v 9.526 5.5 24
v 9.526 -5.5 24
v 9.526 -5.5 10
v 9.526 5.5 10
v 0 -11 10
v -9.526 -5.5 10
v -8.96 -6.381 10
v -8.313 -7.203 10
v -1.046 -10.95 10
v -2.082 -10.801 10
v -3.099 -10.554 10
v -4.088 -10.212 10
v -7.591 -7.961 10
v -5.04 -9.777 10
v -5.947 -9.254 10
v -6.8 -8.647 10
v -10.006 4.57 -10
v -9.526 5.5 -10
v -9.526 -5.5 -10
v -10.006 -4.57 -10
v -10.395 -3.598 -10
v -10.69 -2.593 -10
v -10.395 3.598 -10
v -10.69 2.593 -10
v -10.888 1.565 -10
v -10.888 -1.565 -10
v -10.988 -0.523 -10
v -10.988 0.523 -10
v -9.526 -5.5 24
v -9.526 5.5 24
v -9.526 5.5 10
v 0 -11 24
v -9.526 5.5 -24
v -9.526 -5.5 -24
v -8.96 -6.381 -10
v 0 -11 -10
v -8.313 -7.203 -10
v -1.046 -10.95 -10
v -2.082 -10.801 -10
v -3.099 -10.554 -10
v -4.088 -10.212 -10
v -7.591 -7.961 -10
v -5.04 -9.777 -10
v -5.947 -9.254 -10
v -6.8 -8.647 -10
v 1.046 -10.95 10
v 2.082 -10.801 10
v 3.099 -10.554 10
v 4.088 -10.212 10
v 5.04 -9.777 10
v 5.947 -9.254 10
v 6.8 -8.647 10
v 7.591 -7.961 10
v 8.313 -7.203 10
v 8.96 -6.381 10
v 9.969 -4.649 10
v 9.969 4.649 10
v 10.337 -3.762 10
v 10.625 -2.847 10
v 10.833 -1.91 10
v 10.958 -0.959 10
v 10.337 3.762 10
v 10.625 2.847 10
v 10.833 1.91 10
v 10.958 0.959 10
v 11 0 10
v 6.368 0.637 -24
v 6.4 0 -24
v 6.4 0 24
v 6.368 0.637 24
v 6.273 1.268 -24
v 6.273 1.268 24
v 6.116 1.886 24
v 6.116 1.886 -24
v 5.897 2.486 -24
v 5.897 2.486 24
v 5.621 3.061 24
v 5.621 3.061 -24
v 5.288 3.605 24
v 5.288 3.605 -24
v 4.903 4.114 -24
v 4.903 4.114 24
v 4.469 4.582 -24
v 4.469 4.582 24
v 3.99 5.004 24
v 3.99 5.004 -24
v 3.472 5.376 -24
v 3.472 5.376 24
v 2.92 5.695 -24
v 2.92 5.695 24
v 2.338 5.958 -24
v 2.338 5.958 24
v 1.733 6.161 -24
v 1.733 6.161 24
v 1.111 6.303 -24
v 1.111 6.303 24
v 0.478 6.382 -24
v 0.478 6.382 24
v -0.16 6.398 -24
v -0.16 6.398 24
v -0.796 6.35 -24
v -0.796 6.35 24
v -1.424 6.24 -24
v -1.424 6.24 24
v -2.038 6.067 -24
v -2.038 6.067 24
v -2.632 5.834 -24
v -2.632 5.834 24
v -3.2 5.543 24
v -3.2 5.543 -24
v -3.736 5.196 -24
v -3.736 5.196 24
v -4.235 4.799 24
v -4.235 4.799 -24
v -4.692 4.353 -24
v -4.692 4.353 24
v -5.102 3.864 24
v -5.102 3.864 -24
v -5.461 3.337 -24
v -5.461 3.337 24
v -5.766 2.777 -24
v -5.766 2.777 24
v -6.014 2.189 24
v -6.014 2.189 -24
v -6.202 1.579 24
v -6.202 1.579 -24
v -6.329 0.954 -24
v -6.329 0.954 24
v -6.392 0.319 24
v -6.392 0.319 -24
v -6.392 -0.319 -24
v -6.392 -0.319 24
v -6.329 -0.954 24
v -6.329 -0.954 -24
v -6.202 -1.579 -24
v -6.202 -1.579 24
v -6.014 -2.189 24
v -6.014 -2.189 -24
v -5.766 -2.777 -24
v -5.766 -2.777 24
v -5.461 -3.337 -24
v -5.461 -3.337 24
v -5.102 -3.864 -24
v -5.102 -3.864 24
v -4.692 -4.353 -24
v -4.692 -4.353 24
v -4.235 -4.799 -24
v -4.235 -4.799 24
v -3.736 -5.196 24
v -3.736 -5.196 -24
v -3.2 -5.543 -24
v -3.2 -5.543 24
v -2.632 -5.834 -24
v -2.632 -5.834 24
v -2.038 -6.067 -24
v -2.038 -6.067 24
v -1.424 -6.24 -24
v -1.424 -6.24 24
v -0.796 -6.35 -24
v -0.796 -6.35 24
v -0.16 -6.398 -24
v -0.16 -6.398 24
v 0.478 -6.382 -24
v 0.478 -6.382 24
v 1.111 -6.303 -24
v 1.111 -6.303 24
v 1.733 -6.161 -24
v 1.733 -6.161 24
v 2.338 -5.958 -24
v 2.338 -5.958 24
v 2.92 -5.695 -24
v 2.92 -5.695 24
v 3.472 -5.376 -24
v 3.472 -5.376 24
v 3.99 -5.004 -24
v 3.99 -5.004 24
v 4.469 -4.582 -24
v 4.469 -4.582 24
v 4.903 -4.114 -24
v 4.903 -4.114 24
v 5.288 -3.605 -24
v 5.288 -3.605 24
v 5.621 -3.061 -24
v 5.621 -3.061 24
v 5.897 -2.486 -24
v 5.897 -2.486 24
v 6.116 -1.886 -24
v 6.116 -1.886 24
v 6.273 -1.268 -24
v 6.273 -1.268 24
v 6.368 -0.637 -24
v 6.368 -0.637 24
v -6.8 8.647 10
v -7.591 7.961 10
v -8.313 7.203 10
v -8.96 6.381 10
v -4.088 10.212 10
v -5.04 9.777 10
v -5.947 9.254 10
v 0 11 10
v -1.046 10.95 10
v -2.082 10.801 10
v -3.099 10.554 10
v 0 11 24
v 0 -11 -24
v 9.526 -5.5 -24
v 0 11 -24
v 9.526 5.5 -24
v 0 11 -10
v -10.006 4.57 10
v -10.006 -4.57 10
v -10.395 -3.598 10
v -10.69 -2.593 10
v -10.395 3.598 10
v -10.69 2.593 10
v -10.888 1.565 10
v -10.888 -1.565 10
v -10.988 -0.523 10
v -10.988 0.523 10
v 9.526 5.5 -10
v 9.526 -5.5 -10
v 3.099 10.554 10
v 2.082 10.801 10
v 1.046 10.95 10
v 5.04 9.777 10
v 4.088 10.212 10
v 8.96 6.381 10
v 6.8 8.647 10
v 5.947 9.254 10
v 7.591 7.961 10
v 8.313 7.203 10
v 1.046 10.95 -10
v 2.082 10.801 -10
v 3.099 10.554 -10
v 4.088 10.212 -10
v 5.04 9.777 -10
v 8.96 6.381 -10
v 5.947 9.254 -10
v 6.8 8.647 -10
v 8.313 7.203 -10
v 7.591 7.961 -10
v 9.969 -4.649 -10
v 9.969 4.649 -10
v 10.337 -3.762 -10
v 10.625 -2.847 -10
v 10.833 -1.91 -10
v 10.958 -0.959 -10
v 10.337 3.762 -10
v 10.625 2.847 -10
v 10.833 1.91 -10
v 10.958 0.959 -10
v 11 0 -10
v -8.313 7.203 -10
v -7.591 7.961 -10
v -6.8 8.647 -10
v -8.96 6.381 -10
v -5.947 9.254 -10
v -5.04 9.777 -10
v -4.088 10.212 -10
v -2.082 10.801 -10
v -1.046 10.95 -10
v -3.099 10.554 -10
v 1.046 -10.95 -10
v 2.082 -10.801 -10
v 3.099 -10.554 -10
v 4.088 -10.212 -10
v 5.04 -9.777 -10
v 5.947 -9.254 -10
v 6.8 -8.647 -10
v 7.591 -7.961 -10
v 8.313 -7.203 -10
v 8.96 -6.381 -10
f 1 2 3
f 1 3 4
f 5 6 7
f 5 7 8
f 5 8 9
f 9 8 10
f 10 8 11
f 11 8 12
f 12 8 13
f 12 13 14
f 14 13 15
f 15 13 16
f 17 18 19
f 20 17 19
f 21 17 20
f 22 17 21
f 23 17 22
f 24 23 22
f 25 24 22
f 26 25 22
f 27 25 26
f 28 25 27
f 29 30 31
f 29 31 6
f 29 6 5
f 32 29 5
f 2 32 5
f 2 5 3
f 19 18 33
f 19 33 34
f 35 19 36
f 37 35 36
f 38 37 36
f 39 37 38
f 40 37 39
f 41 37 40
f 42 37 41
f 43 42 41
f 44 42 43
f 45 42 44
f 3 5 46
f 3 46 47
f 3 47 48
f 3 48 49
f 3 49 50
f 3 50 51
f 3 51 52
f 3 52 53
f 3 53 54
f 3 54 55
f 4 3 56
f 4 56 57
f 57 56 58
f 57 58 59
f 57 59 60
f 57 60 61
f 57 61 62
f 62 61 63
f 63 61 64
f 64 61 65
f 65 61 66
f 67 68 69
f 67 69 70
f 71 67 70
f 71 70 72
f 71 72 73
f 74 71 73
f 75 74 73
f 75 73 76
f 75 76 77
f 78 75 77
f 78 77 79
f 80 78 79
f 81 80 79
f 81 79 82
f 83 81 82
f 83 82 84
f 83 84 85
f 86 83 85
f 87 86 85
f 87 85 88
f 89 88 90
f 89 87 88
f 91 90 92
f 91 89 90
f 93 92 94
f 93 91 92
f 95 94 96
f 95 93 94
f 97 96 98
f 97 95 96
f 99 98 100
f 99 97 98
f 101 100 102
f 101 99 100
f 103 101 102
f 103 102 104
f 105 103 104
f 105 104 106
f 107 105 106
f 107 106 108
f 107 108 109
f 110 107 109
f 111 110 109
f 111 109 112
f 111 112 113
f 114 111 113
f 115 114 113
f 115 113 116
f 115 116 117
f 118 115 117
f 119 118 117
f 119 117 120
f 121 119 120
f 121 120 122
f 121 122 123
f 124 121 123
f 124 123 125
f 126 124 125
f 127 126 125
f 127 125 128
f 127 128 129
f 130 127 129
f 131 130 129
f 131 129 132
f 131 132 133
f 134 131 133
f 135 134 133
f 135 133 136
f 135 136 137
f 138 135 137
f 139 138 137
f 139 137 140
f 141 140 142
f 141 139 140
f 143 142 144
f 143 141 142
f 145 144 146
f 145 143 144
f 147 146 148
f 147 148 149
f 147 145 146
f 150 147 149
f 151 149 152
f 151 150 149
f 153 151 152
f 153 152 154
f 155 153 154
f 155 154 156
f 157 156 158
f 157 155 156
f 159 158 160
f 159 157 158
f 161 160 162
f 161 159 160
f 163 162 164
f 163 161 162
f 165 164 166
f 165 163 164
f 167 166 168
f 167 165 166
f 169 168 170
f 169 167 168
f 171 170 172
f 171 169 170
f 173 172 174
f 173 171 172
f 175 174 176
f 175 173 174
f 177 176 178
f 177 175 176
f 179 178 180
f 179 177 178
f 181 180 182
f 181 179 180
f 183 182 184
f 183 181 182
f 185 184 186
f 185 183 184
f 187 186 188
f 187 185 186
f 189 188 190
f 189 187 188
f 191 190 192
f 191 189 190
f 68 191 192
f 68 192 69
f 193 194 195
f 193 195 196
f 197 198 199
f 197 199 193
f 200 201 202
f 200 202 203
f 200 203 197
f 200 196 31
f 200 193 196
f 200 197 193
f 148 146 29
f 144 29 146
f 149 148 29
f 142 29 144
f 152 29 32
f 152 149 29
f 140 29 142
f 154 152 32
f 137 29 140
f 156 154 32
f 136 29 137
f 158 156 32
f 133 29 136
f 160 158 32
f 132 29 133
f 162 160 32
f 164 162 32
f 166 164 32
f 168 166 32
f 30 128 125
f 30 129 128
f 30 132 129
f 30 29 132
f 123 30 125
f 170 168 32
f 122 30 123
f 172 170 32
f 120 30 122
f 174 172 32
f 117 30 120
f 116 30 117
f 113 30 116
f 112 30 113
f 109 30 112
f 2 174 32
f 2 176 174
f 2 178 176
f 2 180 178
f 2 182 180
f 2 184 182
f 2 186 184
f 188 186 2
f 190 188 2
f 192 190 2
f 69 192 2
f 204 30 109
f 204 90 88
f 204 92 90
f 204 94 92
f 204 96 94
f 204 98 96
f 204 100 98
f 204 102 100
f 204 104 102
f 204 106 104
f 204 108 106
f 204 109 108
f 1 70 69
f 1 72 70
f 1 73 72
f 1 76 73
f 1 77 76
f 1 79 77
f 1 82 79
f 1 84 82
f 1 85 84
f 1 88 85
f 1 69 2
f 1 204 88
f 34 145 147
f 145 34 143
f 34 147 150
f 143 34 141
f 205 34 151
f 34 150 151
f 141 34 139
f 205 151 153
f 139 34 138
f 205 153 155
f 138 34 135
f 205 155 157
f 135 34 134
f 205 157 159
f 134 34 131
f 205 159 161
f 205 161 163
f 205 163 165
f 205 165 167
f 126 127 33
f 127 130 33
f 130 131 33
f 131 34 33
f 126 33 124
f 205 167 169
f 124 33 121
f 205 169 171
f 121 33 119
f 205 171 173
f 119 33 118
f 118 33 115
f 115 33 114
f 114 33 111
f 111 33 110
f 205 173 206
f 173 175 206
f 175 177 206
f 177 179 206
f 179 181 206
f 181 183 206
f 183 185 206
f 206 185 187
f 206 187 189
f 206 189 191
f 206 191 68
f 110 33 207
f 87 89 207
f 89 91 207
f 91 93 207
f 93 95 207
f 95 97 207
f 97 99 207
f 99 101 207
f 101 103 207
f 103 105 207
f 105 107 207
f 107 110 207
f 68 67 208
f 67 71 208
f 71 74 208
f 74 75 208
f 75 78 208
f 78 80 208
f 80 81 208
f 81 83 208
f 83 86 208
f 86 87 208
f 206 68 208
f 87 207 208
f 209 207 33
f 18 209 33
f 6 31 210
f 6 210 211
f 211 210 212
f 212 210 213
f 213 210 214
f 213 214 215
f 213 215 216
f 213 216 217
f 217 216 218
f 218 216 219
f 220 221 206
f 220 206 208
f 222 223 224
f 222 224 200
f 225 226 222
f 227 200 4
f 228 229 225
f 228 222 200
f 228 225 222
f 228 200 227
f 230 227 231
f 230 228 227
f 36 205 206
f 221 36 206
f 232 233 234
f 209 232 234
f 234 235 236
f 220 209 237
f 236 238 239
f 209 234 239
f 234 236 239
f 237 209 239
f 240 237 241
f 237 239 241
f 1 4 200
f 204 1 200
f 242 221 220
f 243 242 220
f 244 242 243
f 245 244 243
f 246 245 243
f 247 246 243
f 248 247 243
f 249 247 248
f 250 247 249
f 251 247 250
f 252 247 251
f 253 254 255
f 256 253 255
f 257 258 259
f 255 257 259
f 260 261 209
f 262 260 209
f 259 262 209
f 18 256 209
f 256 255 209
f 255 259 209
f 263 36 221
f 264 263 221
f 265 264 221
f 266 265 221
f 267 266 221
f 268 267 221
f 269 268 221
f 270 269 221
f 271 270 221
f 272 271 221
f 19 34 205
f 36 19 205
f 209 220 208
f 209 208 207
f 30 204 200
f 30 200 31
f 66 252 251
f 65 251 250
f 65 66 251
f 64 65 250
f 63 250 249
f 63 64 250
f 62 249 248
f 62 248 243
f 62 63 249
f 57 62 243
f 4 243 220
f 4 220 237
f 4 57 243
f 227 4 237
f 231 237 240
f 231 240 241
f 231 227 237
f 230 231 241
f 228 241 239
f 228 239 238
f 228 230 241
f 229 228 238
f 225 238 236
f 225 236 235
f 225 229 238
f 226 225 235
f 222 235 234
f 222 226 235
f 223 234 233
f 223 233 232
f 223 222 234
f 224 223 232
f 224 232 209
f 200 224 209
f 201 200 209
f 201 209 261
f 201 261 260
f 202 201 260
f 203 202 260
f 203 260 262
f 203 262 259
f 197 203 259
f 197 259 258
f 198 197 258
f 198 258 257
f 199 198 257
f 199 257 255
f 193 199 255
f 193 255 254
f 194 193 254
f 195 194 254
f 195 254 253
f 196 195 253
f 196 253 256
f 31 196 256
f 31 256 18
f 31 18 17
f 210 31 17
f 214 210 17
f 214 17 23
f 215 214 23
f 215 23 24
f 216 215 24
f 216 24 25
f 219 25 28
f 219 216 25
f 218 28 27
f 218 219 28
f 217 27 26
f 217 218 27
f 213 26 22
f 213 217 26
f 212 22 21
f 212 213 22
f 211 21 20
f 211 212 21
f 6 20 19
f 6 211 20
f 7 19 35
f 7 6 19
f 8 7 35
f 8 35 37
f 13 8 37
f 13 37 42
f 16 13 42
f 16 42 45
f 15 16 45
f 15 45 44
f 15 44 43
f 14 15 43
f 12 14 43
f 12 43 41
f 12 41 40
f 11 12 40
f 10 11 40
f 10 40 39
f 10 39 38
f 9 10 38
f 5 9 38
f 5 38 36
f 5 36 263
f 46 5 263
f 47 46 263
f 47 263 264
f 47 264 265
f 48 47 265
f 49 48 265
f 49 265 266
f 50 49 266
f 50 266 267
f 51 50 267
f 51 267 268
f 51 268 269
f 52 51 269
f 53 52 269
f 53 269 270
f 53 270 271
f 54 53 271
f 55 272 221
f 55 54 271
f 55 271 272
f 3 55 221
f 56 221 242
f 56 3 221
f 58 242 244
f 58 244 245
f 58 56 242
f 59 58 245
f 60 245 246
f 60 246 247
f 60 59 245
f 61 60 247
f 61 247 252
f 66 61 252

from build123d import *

# Parameters (mm, degrees)
SKETCH1_R           = 11
SKETCH1_R_2         = 6.4
BOSS_EXTRUDE1_DEPTH = 10
SKETCH1_3_R         = 6.4
BOSS_EXTRUDE2_DEPTH = 24


with BuildPart() as part:
    # Sketch1 → Boss-Extrude1 (new, symmetric)
    with BuildSketch(Plane.XY):
        Circle(SKETCH1_R)
        Circle(SKETCH1_R_2, mode=Mode.SUBTRACT)
    extrude(amount=BOSS_EXTRUDE1_DEPTH, both=True)

    # Sketch1<3> → Boss-Extrude2 (add, symmetric)
    with BuildSketch(Plane.XY):
        Polygon((-9.526279442, -5.5), (0, -11), (9.526279442, -5.5), (9.526279442, 5.5), (0, 11), (-9.526279442, 5.5), align=None)
        Circle(SKETCH1_3_R, mode=Mode.SUBTRACT)
    extrude(amount=BOSS_EXTRUDE2_DEPTH, both=True)


solid = part.part
